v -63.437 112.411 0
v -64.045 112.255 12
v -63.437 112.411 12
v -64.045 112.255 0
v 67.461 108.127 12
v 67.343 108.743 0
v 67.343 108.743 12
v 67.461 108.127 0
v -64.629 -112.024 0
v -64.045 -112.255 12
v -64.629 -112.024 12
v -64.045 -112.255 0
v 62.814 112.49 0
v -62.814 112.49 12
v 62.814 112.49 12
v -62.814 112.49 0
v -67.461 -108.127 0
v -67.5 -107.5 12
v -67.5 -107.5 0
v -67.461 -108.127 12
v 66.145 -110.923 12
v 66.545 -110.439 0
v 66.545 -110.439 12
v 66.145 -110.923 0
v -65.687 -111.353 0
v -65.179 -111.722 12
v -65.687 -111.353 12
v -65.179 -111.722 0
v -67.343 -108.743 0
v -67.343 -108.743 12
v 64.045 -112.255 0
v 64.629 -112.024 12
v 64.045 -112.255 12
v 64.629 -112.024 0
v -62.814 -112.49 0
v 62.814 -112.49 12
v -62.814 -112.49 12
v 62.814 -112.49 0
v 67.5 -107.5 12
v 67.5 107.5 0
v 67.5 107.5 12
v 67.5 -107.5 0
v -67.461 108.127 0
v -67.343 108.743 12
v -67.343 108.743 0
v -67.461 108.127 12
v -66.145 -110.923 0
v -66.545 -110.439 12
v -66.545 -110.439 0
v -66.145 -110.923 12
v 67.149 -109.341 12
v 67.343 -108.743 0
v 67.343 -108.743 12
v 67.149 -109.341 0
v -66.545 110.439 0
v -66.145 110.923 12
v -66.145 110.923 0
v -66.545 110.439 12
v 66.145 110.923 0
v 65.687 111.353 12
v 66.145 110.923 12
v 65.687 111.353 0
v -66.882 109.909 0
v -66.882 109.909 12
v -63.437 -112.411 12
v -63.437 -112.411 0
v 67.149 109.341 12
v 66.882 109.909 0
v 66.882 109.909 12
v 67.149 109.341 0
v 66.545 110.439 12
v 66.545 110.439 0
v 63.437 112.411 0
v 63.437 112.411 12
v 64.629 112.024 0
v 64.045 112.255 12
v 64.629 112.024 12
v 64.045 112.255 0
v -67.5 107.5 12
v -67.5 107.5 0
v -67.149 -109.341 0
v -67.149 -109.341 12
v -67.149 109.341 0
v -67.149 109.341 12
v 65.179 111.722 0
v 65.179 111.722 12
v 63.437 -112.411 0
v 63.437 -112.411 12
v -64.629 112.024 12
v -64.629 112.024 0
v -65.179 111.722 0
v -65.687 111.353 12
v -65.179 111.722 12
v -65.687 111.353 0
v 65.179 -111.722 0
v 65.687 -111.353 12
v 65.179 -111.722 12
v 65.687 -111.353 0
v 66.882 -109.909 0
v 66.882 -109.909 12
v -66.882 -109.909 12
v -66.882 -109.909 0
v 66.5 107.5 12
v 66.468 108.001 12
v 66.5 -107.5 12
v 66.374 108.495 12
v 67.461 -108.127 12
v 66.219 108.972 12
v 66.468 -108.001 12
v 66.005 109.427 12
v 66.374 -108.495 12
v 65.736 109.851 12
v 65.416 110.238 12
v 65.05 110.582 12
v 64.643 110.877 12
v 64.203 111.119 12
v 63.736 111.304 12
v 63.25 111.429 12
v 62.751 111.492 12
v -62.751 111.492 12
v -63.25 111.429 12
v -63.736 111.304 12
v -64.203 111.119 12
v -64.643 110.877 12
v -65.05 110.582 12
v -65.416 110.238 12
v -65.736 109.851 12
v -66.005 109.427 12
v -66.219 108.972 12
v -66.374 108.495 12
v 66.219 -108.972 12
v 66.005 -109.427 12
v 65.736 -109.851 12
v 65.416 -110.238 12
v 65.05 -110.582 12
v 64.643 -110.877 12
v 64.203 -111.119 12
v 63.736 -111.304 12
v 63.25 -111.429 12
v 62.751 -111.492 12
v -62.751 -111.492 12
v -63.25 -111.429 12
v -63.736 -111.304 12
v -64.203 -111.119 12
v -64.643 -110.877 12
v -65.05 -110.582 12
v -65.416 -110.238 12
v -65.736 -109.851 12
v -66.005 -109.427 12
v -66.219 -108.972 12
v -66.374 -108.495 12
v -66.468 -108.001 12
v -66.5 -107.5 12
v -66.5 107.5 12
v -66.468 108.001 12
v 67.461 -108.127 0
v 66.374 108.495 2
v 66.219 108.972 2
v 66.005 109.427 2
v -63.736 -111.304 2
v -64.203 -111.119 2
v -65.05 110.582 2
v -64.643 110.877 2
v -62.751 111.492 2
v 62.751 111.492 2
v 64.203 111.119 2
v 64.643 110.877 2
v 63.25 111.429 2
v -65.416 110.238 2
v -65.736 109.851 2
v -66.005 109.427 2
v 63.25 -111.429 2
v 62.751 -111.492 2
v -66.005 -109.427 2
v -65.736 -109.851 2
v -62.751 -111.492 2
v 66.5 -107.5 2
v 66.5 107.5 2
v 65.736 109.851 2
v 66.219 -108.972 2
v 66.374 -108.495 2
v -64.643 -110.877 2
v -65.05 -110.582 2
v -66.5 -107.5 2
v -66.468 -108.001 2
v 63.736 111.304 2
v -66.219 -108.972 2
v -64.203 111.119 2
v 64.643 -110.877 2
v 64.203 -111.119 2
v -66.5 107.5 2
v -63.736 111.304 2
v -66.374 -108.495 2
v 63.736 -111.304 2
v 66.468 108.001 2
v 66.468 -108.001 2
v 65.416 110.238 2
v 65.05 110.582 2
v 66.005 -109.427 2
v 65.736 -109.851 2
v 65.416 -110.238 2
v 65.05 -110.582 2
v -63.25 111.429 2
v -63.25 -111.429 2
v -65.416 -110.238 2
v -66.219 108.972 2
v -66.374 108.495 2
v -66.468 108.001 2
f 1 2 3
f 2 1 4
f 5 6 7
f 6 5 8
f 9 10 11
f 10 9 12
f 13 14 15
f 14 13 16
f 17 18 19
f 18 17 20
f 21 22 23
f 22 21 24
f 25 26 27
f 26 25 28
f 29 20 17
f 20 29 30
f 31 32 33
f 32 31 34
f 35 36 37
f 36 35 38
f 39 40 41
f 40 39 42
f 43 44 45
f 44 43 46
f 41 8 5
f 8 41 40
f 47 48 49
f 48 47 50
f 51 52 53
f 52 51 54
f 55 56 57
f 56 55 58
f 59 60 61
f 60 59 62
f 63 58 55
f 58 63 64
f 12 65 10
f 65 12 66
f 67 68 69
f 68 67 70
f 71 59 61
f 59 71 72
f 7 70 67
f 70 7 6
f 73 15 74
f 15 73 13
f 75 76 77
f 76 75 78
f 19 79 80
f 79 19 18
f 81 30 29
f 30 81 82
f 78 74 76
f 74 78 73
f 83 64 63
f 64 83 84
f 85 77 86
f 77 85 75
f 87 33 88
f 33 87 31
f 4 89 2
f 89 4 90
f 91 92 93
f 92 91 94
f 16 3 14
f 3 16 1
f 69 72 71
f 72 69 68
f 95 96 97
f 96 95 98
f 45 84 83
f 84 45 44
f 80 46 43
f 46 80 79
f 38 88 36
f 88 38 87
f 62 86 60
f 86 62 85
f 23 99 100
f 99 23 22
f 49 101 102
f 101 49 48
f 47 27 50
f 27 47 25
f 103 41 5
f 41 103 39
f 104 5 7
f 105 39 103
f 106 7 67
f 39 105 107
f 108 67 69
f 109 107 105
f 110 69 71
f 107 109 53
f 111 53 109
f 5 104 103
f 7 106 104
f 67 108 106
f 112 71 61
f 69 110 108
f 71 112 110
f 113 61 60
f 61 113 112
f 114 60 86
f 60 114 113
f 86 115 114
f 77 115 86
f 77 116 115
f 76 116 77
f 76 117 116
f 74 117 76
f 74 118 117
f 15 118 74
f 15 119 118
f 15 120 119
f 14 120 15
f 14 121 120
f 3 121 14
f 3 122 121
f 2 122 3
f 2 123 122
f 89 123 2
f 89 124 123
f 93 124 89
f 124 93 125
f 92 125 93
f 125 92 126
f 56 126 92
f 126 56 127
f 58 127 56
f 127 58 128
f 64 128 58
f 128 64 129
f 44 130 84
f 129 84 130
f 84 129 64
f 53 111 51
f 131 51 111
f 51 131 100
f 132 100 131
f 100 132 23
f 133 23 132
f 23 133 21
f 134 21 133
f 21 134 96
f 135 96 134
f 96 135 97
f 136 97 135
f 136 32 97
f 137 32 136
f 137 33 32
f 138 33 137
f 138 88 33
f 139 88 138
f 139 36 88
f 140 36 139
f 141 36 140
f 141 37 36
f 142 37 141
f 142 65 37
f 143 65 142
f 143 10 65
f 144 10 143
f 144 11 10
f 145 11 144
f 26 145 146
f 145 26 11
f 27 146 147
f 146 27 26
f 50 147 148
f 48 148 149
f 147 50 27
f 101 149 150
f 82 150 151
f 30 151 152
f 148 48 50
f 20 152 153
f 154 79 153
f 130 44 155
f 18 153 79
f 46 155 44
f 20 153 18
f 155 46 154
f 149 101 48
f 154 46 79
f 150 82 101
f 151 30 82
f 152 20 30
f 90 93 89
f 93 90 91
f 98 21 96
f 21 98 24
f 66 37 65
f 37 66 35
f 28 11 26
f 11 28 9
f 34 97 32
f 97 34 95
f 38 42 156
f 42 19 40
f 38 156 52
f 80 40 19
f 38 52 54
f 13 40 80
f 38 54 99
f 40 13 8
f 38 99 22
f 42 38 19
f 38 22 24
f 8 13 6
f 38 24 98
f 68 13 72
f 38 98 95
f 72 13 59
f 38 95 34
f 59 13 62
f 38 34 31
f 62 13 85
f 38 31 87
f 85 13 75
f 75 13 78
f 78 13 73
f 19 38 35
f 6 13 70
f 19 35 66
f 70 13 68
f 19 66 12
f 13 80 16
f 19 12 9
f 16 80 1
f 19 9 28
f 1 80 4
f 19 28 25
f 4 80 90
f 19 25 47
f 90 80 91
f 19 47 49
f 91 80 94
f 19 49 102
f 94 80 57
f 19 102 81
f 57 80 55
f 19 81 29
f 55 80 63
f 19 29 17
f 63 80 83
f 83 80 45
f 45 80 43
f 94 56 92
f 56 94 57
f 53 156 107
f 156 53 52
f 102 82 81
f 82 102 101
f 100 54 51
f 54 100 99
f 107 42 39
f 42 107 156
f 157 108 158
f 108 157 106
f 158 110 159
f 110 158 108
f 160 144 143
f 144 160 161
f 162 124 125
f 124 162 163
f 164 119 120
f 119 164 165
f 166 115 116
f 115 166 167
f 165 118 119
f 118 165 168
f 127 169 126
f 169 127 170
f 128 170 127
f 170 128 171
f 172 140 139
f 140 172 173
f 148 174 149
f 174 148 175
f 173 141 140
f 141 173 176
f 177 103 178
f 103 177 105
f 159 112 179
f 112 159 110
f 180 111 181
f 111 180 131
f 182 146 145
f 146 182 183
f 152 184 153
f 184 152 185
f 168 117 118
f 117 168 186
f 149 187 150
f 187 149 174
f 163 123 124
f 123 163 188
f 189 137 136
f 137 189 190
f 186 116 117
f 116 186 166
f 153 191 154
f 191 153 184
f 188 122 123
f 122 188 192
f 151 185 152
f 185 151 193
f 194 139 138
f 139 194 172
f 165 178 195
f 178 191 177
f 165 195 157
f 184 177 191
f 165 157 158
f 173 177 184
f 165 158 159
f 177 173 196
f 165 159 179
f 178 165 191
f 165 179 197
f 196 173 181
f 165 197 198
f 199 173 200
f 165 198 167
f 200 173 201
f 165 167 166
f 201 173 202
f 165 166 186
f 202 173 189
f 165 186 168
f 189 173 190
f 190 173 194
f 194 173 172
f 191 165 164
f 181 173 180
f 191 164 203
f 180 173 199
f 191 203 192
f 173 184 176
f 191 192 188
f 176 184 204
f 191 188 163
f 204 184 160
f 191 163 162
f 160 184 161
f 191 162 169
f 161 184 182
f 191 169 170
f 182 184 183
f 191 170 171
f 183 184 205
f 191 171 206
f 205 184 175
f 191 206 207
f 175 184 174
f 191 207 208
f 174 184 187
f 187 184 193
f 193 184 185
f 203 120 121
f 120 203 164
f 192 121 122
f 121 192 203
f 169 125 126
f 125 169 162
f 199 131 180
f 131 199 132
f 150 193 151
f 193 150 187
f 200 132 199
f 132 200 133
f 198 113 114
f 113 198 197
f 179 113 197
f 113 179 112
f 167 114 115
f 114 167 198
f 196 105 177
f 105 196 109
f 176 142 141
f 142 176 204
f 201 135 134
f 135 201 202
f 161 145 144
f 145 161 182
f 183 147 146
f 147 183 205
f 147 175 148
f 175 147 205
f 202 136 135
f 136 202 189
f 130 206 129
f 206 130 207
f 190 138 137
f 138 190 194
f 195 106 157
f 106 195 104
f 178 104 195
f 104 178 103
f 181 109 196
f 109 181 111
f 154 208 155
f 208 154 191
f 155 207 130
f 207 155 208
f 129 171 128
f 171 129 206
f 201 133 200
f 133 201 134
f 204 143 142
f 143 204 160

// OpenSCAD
$fn = 50;


difference() {
	union() {
		hull() {
			translate(v = [-62.5000000000, 107.5000000000, 0]) {
				cylinder(h = 12, r = 5);
			}
			translate(v = [62.5000000000, 107.5000000000, 0]) {
				cylinder(h = 12, r = 5);
			}
			translate(v = [-62.5000000000, -107.5000000000, 0]) {
				cylinder(h = 12, r = 5);
			}
			translate(v = [62.5000000000, -107.5000000000, 0]) {
				cylinder(h = 12, r = 5);
			}
		}
	}
	union() {
		translate(v = [0, 0, 2]) {
			hull() {
				translate(v = [-62.5000000000, 107.5000000000, 0]) {
					cylinder(h = 10, r = 4);
				}
				translate(v = [62.5000000000, 107.5000000000, 0]) {
					cylinder(h = 10, r = 4);
				}
				translate(v = [-62.5000000000, -107.5000000000, 0]) {
					cylinder(h = 10, r = 4);
				}
				translate(v = [62.5000000000, -107.5000000000, 0]) {
					cylinder(h = 10, r = 4);
				}
			}
		}
	}
}
